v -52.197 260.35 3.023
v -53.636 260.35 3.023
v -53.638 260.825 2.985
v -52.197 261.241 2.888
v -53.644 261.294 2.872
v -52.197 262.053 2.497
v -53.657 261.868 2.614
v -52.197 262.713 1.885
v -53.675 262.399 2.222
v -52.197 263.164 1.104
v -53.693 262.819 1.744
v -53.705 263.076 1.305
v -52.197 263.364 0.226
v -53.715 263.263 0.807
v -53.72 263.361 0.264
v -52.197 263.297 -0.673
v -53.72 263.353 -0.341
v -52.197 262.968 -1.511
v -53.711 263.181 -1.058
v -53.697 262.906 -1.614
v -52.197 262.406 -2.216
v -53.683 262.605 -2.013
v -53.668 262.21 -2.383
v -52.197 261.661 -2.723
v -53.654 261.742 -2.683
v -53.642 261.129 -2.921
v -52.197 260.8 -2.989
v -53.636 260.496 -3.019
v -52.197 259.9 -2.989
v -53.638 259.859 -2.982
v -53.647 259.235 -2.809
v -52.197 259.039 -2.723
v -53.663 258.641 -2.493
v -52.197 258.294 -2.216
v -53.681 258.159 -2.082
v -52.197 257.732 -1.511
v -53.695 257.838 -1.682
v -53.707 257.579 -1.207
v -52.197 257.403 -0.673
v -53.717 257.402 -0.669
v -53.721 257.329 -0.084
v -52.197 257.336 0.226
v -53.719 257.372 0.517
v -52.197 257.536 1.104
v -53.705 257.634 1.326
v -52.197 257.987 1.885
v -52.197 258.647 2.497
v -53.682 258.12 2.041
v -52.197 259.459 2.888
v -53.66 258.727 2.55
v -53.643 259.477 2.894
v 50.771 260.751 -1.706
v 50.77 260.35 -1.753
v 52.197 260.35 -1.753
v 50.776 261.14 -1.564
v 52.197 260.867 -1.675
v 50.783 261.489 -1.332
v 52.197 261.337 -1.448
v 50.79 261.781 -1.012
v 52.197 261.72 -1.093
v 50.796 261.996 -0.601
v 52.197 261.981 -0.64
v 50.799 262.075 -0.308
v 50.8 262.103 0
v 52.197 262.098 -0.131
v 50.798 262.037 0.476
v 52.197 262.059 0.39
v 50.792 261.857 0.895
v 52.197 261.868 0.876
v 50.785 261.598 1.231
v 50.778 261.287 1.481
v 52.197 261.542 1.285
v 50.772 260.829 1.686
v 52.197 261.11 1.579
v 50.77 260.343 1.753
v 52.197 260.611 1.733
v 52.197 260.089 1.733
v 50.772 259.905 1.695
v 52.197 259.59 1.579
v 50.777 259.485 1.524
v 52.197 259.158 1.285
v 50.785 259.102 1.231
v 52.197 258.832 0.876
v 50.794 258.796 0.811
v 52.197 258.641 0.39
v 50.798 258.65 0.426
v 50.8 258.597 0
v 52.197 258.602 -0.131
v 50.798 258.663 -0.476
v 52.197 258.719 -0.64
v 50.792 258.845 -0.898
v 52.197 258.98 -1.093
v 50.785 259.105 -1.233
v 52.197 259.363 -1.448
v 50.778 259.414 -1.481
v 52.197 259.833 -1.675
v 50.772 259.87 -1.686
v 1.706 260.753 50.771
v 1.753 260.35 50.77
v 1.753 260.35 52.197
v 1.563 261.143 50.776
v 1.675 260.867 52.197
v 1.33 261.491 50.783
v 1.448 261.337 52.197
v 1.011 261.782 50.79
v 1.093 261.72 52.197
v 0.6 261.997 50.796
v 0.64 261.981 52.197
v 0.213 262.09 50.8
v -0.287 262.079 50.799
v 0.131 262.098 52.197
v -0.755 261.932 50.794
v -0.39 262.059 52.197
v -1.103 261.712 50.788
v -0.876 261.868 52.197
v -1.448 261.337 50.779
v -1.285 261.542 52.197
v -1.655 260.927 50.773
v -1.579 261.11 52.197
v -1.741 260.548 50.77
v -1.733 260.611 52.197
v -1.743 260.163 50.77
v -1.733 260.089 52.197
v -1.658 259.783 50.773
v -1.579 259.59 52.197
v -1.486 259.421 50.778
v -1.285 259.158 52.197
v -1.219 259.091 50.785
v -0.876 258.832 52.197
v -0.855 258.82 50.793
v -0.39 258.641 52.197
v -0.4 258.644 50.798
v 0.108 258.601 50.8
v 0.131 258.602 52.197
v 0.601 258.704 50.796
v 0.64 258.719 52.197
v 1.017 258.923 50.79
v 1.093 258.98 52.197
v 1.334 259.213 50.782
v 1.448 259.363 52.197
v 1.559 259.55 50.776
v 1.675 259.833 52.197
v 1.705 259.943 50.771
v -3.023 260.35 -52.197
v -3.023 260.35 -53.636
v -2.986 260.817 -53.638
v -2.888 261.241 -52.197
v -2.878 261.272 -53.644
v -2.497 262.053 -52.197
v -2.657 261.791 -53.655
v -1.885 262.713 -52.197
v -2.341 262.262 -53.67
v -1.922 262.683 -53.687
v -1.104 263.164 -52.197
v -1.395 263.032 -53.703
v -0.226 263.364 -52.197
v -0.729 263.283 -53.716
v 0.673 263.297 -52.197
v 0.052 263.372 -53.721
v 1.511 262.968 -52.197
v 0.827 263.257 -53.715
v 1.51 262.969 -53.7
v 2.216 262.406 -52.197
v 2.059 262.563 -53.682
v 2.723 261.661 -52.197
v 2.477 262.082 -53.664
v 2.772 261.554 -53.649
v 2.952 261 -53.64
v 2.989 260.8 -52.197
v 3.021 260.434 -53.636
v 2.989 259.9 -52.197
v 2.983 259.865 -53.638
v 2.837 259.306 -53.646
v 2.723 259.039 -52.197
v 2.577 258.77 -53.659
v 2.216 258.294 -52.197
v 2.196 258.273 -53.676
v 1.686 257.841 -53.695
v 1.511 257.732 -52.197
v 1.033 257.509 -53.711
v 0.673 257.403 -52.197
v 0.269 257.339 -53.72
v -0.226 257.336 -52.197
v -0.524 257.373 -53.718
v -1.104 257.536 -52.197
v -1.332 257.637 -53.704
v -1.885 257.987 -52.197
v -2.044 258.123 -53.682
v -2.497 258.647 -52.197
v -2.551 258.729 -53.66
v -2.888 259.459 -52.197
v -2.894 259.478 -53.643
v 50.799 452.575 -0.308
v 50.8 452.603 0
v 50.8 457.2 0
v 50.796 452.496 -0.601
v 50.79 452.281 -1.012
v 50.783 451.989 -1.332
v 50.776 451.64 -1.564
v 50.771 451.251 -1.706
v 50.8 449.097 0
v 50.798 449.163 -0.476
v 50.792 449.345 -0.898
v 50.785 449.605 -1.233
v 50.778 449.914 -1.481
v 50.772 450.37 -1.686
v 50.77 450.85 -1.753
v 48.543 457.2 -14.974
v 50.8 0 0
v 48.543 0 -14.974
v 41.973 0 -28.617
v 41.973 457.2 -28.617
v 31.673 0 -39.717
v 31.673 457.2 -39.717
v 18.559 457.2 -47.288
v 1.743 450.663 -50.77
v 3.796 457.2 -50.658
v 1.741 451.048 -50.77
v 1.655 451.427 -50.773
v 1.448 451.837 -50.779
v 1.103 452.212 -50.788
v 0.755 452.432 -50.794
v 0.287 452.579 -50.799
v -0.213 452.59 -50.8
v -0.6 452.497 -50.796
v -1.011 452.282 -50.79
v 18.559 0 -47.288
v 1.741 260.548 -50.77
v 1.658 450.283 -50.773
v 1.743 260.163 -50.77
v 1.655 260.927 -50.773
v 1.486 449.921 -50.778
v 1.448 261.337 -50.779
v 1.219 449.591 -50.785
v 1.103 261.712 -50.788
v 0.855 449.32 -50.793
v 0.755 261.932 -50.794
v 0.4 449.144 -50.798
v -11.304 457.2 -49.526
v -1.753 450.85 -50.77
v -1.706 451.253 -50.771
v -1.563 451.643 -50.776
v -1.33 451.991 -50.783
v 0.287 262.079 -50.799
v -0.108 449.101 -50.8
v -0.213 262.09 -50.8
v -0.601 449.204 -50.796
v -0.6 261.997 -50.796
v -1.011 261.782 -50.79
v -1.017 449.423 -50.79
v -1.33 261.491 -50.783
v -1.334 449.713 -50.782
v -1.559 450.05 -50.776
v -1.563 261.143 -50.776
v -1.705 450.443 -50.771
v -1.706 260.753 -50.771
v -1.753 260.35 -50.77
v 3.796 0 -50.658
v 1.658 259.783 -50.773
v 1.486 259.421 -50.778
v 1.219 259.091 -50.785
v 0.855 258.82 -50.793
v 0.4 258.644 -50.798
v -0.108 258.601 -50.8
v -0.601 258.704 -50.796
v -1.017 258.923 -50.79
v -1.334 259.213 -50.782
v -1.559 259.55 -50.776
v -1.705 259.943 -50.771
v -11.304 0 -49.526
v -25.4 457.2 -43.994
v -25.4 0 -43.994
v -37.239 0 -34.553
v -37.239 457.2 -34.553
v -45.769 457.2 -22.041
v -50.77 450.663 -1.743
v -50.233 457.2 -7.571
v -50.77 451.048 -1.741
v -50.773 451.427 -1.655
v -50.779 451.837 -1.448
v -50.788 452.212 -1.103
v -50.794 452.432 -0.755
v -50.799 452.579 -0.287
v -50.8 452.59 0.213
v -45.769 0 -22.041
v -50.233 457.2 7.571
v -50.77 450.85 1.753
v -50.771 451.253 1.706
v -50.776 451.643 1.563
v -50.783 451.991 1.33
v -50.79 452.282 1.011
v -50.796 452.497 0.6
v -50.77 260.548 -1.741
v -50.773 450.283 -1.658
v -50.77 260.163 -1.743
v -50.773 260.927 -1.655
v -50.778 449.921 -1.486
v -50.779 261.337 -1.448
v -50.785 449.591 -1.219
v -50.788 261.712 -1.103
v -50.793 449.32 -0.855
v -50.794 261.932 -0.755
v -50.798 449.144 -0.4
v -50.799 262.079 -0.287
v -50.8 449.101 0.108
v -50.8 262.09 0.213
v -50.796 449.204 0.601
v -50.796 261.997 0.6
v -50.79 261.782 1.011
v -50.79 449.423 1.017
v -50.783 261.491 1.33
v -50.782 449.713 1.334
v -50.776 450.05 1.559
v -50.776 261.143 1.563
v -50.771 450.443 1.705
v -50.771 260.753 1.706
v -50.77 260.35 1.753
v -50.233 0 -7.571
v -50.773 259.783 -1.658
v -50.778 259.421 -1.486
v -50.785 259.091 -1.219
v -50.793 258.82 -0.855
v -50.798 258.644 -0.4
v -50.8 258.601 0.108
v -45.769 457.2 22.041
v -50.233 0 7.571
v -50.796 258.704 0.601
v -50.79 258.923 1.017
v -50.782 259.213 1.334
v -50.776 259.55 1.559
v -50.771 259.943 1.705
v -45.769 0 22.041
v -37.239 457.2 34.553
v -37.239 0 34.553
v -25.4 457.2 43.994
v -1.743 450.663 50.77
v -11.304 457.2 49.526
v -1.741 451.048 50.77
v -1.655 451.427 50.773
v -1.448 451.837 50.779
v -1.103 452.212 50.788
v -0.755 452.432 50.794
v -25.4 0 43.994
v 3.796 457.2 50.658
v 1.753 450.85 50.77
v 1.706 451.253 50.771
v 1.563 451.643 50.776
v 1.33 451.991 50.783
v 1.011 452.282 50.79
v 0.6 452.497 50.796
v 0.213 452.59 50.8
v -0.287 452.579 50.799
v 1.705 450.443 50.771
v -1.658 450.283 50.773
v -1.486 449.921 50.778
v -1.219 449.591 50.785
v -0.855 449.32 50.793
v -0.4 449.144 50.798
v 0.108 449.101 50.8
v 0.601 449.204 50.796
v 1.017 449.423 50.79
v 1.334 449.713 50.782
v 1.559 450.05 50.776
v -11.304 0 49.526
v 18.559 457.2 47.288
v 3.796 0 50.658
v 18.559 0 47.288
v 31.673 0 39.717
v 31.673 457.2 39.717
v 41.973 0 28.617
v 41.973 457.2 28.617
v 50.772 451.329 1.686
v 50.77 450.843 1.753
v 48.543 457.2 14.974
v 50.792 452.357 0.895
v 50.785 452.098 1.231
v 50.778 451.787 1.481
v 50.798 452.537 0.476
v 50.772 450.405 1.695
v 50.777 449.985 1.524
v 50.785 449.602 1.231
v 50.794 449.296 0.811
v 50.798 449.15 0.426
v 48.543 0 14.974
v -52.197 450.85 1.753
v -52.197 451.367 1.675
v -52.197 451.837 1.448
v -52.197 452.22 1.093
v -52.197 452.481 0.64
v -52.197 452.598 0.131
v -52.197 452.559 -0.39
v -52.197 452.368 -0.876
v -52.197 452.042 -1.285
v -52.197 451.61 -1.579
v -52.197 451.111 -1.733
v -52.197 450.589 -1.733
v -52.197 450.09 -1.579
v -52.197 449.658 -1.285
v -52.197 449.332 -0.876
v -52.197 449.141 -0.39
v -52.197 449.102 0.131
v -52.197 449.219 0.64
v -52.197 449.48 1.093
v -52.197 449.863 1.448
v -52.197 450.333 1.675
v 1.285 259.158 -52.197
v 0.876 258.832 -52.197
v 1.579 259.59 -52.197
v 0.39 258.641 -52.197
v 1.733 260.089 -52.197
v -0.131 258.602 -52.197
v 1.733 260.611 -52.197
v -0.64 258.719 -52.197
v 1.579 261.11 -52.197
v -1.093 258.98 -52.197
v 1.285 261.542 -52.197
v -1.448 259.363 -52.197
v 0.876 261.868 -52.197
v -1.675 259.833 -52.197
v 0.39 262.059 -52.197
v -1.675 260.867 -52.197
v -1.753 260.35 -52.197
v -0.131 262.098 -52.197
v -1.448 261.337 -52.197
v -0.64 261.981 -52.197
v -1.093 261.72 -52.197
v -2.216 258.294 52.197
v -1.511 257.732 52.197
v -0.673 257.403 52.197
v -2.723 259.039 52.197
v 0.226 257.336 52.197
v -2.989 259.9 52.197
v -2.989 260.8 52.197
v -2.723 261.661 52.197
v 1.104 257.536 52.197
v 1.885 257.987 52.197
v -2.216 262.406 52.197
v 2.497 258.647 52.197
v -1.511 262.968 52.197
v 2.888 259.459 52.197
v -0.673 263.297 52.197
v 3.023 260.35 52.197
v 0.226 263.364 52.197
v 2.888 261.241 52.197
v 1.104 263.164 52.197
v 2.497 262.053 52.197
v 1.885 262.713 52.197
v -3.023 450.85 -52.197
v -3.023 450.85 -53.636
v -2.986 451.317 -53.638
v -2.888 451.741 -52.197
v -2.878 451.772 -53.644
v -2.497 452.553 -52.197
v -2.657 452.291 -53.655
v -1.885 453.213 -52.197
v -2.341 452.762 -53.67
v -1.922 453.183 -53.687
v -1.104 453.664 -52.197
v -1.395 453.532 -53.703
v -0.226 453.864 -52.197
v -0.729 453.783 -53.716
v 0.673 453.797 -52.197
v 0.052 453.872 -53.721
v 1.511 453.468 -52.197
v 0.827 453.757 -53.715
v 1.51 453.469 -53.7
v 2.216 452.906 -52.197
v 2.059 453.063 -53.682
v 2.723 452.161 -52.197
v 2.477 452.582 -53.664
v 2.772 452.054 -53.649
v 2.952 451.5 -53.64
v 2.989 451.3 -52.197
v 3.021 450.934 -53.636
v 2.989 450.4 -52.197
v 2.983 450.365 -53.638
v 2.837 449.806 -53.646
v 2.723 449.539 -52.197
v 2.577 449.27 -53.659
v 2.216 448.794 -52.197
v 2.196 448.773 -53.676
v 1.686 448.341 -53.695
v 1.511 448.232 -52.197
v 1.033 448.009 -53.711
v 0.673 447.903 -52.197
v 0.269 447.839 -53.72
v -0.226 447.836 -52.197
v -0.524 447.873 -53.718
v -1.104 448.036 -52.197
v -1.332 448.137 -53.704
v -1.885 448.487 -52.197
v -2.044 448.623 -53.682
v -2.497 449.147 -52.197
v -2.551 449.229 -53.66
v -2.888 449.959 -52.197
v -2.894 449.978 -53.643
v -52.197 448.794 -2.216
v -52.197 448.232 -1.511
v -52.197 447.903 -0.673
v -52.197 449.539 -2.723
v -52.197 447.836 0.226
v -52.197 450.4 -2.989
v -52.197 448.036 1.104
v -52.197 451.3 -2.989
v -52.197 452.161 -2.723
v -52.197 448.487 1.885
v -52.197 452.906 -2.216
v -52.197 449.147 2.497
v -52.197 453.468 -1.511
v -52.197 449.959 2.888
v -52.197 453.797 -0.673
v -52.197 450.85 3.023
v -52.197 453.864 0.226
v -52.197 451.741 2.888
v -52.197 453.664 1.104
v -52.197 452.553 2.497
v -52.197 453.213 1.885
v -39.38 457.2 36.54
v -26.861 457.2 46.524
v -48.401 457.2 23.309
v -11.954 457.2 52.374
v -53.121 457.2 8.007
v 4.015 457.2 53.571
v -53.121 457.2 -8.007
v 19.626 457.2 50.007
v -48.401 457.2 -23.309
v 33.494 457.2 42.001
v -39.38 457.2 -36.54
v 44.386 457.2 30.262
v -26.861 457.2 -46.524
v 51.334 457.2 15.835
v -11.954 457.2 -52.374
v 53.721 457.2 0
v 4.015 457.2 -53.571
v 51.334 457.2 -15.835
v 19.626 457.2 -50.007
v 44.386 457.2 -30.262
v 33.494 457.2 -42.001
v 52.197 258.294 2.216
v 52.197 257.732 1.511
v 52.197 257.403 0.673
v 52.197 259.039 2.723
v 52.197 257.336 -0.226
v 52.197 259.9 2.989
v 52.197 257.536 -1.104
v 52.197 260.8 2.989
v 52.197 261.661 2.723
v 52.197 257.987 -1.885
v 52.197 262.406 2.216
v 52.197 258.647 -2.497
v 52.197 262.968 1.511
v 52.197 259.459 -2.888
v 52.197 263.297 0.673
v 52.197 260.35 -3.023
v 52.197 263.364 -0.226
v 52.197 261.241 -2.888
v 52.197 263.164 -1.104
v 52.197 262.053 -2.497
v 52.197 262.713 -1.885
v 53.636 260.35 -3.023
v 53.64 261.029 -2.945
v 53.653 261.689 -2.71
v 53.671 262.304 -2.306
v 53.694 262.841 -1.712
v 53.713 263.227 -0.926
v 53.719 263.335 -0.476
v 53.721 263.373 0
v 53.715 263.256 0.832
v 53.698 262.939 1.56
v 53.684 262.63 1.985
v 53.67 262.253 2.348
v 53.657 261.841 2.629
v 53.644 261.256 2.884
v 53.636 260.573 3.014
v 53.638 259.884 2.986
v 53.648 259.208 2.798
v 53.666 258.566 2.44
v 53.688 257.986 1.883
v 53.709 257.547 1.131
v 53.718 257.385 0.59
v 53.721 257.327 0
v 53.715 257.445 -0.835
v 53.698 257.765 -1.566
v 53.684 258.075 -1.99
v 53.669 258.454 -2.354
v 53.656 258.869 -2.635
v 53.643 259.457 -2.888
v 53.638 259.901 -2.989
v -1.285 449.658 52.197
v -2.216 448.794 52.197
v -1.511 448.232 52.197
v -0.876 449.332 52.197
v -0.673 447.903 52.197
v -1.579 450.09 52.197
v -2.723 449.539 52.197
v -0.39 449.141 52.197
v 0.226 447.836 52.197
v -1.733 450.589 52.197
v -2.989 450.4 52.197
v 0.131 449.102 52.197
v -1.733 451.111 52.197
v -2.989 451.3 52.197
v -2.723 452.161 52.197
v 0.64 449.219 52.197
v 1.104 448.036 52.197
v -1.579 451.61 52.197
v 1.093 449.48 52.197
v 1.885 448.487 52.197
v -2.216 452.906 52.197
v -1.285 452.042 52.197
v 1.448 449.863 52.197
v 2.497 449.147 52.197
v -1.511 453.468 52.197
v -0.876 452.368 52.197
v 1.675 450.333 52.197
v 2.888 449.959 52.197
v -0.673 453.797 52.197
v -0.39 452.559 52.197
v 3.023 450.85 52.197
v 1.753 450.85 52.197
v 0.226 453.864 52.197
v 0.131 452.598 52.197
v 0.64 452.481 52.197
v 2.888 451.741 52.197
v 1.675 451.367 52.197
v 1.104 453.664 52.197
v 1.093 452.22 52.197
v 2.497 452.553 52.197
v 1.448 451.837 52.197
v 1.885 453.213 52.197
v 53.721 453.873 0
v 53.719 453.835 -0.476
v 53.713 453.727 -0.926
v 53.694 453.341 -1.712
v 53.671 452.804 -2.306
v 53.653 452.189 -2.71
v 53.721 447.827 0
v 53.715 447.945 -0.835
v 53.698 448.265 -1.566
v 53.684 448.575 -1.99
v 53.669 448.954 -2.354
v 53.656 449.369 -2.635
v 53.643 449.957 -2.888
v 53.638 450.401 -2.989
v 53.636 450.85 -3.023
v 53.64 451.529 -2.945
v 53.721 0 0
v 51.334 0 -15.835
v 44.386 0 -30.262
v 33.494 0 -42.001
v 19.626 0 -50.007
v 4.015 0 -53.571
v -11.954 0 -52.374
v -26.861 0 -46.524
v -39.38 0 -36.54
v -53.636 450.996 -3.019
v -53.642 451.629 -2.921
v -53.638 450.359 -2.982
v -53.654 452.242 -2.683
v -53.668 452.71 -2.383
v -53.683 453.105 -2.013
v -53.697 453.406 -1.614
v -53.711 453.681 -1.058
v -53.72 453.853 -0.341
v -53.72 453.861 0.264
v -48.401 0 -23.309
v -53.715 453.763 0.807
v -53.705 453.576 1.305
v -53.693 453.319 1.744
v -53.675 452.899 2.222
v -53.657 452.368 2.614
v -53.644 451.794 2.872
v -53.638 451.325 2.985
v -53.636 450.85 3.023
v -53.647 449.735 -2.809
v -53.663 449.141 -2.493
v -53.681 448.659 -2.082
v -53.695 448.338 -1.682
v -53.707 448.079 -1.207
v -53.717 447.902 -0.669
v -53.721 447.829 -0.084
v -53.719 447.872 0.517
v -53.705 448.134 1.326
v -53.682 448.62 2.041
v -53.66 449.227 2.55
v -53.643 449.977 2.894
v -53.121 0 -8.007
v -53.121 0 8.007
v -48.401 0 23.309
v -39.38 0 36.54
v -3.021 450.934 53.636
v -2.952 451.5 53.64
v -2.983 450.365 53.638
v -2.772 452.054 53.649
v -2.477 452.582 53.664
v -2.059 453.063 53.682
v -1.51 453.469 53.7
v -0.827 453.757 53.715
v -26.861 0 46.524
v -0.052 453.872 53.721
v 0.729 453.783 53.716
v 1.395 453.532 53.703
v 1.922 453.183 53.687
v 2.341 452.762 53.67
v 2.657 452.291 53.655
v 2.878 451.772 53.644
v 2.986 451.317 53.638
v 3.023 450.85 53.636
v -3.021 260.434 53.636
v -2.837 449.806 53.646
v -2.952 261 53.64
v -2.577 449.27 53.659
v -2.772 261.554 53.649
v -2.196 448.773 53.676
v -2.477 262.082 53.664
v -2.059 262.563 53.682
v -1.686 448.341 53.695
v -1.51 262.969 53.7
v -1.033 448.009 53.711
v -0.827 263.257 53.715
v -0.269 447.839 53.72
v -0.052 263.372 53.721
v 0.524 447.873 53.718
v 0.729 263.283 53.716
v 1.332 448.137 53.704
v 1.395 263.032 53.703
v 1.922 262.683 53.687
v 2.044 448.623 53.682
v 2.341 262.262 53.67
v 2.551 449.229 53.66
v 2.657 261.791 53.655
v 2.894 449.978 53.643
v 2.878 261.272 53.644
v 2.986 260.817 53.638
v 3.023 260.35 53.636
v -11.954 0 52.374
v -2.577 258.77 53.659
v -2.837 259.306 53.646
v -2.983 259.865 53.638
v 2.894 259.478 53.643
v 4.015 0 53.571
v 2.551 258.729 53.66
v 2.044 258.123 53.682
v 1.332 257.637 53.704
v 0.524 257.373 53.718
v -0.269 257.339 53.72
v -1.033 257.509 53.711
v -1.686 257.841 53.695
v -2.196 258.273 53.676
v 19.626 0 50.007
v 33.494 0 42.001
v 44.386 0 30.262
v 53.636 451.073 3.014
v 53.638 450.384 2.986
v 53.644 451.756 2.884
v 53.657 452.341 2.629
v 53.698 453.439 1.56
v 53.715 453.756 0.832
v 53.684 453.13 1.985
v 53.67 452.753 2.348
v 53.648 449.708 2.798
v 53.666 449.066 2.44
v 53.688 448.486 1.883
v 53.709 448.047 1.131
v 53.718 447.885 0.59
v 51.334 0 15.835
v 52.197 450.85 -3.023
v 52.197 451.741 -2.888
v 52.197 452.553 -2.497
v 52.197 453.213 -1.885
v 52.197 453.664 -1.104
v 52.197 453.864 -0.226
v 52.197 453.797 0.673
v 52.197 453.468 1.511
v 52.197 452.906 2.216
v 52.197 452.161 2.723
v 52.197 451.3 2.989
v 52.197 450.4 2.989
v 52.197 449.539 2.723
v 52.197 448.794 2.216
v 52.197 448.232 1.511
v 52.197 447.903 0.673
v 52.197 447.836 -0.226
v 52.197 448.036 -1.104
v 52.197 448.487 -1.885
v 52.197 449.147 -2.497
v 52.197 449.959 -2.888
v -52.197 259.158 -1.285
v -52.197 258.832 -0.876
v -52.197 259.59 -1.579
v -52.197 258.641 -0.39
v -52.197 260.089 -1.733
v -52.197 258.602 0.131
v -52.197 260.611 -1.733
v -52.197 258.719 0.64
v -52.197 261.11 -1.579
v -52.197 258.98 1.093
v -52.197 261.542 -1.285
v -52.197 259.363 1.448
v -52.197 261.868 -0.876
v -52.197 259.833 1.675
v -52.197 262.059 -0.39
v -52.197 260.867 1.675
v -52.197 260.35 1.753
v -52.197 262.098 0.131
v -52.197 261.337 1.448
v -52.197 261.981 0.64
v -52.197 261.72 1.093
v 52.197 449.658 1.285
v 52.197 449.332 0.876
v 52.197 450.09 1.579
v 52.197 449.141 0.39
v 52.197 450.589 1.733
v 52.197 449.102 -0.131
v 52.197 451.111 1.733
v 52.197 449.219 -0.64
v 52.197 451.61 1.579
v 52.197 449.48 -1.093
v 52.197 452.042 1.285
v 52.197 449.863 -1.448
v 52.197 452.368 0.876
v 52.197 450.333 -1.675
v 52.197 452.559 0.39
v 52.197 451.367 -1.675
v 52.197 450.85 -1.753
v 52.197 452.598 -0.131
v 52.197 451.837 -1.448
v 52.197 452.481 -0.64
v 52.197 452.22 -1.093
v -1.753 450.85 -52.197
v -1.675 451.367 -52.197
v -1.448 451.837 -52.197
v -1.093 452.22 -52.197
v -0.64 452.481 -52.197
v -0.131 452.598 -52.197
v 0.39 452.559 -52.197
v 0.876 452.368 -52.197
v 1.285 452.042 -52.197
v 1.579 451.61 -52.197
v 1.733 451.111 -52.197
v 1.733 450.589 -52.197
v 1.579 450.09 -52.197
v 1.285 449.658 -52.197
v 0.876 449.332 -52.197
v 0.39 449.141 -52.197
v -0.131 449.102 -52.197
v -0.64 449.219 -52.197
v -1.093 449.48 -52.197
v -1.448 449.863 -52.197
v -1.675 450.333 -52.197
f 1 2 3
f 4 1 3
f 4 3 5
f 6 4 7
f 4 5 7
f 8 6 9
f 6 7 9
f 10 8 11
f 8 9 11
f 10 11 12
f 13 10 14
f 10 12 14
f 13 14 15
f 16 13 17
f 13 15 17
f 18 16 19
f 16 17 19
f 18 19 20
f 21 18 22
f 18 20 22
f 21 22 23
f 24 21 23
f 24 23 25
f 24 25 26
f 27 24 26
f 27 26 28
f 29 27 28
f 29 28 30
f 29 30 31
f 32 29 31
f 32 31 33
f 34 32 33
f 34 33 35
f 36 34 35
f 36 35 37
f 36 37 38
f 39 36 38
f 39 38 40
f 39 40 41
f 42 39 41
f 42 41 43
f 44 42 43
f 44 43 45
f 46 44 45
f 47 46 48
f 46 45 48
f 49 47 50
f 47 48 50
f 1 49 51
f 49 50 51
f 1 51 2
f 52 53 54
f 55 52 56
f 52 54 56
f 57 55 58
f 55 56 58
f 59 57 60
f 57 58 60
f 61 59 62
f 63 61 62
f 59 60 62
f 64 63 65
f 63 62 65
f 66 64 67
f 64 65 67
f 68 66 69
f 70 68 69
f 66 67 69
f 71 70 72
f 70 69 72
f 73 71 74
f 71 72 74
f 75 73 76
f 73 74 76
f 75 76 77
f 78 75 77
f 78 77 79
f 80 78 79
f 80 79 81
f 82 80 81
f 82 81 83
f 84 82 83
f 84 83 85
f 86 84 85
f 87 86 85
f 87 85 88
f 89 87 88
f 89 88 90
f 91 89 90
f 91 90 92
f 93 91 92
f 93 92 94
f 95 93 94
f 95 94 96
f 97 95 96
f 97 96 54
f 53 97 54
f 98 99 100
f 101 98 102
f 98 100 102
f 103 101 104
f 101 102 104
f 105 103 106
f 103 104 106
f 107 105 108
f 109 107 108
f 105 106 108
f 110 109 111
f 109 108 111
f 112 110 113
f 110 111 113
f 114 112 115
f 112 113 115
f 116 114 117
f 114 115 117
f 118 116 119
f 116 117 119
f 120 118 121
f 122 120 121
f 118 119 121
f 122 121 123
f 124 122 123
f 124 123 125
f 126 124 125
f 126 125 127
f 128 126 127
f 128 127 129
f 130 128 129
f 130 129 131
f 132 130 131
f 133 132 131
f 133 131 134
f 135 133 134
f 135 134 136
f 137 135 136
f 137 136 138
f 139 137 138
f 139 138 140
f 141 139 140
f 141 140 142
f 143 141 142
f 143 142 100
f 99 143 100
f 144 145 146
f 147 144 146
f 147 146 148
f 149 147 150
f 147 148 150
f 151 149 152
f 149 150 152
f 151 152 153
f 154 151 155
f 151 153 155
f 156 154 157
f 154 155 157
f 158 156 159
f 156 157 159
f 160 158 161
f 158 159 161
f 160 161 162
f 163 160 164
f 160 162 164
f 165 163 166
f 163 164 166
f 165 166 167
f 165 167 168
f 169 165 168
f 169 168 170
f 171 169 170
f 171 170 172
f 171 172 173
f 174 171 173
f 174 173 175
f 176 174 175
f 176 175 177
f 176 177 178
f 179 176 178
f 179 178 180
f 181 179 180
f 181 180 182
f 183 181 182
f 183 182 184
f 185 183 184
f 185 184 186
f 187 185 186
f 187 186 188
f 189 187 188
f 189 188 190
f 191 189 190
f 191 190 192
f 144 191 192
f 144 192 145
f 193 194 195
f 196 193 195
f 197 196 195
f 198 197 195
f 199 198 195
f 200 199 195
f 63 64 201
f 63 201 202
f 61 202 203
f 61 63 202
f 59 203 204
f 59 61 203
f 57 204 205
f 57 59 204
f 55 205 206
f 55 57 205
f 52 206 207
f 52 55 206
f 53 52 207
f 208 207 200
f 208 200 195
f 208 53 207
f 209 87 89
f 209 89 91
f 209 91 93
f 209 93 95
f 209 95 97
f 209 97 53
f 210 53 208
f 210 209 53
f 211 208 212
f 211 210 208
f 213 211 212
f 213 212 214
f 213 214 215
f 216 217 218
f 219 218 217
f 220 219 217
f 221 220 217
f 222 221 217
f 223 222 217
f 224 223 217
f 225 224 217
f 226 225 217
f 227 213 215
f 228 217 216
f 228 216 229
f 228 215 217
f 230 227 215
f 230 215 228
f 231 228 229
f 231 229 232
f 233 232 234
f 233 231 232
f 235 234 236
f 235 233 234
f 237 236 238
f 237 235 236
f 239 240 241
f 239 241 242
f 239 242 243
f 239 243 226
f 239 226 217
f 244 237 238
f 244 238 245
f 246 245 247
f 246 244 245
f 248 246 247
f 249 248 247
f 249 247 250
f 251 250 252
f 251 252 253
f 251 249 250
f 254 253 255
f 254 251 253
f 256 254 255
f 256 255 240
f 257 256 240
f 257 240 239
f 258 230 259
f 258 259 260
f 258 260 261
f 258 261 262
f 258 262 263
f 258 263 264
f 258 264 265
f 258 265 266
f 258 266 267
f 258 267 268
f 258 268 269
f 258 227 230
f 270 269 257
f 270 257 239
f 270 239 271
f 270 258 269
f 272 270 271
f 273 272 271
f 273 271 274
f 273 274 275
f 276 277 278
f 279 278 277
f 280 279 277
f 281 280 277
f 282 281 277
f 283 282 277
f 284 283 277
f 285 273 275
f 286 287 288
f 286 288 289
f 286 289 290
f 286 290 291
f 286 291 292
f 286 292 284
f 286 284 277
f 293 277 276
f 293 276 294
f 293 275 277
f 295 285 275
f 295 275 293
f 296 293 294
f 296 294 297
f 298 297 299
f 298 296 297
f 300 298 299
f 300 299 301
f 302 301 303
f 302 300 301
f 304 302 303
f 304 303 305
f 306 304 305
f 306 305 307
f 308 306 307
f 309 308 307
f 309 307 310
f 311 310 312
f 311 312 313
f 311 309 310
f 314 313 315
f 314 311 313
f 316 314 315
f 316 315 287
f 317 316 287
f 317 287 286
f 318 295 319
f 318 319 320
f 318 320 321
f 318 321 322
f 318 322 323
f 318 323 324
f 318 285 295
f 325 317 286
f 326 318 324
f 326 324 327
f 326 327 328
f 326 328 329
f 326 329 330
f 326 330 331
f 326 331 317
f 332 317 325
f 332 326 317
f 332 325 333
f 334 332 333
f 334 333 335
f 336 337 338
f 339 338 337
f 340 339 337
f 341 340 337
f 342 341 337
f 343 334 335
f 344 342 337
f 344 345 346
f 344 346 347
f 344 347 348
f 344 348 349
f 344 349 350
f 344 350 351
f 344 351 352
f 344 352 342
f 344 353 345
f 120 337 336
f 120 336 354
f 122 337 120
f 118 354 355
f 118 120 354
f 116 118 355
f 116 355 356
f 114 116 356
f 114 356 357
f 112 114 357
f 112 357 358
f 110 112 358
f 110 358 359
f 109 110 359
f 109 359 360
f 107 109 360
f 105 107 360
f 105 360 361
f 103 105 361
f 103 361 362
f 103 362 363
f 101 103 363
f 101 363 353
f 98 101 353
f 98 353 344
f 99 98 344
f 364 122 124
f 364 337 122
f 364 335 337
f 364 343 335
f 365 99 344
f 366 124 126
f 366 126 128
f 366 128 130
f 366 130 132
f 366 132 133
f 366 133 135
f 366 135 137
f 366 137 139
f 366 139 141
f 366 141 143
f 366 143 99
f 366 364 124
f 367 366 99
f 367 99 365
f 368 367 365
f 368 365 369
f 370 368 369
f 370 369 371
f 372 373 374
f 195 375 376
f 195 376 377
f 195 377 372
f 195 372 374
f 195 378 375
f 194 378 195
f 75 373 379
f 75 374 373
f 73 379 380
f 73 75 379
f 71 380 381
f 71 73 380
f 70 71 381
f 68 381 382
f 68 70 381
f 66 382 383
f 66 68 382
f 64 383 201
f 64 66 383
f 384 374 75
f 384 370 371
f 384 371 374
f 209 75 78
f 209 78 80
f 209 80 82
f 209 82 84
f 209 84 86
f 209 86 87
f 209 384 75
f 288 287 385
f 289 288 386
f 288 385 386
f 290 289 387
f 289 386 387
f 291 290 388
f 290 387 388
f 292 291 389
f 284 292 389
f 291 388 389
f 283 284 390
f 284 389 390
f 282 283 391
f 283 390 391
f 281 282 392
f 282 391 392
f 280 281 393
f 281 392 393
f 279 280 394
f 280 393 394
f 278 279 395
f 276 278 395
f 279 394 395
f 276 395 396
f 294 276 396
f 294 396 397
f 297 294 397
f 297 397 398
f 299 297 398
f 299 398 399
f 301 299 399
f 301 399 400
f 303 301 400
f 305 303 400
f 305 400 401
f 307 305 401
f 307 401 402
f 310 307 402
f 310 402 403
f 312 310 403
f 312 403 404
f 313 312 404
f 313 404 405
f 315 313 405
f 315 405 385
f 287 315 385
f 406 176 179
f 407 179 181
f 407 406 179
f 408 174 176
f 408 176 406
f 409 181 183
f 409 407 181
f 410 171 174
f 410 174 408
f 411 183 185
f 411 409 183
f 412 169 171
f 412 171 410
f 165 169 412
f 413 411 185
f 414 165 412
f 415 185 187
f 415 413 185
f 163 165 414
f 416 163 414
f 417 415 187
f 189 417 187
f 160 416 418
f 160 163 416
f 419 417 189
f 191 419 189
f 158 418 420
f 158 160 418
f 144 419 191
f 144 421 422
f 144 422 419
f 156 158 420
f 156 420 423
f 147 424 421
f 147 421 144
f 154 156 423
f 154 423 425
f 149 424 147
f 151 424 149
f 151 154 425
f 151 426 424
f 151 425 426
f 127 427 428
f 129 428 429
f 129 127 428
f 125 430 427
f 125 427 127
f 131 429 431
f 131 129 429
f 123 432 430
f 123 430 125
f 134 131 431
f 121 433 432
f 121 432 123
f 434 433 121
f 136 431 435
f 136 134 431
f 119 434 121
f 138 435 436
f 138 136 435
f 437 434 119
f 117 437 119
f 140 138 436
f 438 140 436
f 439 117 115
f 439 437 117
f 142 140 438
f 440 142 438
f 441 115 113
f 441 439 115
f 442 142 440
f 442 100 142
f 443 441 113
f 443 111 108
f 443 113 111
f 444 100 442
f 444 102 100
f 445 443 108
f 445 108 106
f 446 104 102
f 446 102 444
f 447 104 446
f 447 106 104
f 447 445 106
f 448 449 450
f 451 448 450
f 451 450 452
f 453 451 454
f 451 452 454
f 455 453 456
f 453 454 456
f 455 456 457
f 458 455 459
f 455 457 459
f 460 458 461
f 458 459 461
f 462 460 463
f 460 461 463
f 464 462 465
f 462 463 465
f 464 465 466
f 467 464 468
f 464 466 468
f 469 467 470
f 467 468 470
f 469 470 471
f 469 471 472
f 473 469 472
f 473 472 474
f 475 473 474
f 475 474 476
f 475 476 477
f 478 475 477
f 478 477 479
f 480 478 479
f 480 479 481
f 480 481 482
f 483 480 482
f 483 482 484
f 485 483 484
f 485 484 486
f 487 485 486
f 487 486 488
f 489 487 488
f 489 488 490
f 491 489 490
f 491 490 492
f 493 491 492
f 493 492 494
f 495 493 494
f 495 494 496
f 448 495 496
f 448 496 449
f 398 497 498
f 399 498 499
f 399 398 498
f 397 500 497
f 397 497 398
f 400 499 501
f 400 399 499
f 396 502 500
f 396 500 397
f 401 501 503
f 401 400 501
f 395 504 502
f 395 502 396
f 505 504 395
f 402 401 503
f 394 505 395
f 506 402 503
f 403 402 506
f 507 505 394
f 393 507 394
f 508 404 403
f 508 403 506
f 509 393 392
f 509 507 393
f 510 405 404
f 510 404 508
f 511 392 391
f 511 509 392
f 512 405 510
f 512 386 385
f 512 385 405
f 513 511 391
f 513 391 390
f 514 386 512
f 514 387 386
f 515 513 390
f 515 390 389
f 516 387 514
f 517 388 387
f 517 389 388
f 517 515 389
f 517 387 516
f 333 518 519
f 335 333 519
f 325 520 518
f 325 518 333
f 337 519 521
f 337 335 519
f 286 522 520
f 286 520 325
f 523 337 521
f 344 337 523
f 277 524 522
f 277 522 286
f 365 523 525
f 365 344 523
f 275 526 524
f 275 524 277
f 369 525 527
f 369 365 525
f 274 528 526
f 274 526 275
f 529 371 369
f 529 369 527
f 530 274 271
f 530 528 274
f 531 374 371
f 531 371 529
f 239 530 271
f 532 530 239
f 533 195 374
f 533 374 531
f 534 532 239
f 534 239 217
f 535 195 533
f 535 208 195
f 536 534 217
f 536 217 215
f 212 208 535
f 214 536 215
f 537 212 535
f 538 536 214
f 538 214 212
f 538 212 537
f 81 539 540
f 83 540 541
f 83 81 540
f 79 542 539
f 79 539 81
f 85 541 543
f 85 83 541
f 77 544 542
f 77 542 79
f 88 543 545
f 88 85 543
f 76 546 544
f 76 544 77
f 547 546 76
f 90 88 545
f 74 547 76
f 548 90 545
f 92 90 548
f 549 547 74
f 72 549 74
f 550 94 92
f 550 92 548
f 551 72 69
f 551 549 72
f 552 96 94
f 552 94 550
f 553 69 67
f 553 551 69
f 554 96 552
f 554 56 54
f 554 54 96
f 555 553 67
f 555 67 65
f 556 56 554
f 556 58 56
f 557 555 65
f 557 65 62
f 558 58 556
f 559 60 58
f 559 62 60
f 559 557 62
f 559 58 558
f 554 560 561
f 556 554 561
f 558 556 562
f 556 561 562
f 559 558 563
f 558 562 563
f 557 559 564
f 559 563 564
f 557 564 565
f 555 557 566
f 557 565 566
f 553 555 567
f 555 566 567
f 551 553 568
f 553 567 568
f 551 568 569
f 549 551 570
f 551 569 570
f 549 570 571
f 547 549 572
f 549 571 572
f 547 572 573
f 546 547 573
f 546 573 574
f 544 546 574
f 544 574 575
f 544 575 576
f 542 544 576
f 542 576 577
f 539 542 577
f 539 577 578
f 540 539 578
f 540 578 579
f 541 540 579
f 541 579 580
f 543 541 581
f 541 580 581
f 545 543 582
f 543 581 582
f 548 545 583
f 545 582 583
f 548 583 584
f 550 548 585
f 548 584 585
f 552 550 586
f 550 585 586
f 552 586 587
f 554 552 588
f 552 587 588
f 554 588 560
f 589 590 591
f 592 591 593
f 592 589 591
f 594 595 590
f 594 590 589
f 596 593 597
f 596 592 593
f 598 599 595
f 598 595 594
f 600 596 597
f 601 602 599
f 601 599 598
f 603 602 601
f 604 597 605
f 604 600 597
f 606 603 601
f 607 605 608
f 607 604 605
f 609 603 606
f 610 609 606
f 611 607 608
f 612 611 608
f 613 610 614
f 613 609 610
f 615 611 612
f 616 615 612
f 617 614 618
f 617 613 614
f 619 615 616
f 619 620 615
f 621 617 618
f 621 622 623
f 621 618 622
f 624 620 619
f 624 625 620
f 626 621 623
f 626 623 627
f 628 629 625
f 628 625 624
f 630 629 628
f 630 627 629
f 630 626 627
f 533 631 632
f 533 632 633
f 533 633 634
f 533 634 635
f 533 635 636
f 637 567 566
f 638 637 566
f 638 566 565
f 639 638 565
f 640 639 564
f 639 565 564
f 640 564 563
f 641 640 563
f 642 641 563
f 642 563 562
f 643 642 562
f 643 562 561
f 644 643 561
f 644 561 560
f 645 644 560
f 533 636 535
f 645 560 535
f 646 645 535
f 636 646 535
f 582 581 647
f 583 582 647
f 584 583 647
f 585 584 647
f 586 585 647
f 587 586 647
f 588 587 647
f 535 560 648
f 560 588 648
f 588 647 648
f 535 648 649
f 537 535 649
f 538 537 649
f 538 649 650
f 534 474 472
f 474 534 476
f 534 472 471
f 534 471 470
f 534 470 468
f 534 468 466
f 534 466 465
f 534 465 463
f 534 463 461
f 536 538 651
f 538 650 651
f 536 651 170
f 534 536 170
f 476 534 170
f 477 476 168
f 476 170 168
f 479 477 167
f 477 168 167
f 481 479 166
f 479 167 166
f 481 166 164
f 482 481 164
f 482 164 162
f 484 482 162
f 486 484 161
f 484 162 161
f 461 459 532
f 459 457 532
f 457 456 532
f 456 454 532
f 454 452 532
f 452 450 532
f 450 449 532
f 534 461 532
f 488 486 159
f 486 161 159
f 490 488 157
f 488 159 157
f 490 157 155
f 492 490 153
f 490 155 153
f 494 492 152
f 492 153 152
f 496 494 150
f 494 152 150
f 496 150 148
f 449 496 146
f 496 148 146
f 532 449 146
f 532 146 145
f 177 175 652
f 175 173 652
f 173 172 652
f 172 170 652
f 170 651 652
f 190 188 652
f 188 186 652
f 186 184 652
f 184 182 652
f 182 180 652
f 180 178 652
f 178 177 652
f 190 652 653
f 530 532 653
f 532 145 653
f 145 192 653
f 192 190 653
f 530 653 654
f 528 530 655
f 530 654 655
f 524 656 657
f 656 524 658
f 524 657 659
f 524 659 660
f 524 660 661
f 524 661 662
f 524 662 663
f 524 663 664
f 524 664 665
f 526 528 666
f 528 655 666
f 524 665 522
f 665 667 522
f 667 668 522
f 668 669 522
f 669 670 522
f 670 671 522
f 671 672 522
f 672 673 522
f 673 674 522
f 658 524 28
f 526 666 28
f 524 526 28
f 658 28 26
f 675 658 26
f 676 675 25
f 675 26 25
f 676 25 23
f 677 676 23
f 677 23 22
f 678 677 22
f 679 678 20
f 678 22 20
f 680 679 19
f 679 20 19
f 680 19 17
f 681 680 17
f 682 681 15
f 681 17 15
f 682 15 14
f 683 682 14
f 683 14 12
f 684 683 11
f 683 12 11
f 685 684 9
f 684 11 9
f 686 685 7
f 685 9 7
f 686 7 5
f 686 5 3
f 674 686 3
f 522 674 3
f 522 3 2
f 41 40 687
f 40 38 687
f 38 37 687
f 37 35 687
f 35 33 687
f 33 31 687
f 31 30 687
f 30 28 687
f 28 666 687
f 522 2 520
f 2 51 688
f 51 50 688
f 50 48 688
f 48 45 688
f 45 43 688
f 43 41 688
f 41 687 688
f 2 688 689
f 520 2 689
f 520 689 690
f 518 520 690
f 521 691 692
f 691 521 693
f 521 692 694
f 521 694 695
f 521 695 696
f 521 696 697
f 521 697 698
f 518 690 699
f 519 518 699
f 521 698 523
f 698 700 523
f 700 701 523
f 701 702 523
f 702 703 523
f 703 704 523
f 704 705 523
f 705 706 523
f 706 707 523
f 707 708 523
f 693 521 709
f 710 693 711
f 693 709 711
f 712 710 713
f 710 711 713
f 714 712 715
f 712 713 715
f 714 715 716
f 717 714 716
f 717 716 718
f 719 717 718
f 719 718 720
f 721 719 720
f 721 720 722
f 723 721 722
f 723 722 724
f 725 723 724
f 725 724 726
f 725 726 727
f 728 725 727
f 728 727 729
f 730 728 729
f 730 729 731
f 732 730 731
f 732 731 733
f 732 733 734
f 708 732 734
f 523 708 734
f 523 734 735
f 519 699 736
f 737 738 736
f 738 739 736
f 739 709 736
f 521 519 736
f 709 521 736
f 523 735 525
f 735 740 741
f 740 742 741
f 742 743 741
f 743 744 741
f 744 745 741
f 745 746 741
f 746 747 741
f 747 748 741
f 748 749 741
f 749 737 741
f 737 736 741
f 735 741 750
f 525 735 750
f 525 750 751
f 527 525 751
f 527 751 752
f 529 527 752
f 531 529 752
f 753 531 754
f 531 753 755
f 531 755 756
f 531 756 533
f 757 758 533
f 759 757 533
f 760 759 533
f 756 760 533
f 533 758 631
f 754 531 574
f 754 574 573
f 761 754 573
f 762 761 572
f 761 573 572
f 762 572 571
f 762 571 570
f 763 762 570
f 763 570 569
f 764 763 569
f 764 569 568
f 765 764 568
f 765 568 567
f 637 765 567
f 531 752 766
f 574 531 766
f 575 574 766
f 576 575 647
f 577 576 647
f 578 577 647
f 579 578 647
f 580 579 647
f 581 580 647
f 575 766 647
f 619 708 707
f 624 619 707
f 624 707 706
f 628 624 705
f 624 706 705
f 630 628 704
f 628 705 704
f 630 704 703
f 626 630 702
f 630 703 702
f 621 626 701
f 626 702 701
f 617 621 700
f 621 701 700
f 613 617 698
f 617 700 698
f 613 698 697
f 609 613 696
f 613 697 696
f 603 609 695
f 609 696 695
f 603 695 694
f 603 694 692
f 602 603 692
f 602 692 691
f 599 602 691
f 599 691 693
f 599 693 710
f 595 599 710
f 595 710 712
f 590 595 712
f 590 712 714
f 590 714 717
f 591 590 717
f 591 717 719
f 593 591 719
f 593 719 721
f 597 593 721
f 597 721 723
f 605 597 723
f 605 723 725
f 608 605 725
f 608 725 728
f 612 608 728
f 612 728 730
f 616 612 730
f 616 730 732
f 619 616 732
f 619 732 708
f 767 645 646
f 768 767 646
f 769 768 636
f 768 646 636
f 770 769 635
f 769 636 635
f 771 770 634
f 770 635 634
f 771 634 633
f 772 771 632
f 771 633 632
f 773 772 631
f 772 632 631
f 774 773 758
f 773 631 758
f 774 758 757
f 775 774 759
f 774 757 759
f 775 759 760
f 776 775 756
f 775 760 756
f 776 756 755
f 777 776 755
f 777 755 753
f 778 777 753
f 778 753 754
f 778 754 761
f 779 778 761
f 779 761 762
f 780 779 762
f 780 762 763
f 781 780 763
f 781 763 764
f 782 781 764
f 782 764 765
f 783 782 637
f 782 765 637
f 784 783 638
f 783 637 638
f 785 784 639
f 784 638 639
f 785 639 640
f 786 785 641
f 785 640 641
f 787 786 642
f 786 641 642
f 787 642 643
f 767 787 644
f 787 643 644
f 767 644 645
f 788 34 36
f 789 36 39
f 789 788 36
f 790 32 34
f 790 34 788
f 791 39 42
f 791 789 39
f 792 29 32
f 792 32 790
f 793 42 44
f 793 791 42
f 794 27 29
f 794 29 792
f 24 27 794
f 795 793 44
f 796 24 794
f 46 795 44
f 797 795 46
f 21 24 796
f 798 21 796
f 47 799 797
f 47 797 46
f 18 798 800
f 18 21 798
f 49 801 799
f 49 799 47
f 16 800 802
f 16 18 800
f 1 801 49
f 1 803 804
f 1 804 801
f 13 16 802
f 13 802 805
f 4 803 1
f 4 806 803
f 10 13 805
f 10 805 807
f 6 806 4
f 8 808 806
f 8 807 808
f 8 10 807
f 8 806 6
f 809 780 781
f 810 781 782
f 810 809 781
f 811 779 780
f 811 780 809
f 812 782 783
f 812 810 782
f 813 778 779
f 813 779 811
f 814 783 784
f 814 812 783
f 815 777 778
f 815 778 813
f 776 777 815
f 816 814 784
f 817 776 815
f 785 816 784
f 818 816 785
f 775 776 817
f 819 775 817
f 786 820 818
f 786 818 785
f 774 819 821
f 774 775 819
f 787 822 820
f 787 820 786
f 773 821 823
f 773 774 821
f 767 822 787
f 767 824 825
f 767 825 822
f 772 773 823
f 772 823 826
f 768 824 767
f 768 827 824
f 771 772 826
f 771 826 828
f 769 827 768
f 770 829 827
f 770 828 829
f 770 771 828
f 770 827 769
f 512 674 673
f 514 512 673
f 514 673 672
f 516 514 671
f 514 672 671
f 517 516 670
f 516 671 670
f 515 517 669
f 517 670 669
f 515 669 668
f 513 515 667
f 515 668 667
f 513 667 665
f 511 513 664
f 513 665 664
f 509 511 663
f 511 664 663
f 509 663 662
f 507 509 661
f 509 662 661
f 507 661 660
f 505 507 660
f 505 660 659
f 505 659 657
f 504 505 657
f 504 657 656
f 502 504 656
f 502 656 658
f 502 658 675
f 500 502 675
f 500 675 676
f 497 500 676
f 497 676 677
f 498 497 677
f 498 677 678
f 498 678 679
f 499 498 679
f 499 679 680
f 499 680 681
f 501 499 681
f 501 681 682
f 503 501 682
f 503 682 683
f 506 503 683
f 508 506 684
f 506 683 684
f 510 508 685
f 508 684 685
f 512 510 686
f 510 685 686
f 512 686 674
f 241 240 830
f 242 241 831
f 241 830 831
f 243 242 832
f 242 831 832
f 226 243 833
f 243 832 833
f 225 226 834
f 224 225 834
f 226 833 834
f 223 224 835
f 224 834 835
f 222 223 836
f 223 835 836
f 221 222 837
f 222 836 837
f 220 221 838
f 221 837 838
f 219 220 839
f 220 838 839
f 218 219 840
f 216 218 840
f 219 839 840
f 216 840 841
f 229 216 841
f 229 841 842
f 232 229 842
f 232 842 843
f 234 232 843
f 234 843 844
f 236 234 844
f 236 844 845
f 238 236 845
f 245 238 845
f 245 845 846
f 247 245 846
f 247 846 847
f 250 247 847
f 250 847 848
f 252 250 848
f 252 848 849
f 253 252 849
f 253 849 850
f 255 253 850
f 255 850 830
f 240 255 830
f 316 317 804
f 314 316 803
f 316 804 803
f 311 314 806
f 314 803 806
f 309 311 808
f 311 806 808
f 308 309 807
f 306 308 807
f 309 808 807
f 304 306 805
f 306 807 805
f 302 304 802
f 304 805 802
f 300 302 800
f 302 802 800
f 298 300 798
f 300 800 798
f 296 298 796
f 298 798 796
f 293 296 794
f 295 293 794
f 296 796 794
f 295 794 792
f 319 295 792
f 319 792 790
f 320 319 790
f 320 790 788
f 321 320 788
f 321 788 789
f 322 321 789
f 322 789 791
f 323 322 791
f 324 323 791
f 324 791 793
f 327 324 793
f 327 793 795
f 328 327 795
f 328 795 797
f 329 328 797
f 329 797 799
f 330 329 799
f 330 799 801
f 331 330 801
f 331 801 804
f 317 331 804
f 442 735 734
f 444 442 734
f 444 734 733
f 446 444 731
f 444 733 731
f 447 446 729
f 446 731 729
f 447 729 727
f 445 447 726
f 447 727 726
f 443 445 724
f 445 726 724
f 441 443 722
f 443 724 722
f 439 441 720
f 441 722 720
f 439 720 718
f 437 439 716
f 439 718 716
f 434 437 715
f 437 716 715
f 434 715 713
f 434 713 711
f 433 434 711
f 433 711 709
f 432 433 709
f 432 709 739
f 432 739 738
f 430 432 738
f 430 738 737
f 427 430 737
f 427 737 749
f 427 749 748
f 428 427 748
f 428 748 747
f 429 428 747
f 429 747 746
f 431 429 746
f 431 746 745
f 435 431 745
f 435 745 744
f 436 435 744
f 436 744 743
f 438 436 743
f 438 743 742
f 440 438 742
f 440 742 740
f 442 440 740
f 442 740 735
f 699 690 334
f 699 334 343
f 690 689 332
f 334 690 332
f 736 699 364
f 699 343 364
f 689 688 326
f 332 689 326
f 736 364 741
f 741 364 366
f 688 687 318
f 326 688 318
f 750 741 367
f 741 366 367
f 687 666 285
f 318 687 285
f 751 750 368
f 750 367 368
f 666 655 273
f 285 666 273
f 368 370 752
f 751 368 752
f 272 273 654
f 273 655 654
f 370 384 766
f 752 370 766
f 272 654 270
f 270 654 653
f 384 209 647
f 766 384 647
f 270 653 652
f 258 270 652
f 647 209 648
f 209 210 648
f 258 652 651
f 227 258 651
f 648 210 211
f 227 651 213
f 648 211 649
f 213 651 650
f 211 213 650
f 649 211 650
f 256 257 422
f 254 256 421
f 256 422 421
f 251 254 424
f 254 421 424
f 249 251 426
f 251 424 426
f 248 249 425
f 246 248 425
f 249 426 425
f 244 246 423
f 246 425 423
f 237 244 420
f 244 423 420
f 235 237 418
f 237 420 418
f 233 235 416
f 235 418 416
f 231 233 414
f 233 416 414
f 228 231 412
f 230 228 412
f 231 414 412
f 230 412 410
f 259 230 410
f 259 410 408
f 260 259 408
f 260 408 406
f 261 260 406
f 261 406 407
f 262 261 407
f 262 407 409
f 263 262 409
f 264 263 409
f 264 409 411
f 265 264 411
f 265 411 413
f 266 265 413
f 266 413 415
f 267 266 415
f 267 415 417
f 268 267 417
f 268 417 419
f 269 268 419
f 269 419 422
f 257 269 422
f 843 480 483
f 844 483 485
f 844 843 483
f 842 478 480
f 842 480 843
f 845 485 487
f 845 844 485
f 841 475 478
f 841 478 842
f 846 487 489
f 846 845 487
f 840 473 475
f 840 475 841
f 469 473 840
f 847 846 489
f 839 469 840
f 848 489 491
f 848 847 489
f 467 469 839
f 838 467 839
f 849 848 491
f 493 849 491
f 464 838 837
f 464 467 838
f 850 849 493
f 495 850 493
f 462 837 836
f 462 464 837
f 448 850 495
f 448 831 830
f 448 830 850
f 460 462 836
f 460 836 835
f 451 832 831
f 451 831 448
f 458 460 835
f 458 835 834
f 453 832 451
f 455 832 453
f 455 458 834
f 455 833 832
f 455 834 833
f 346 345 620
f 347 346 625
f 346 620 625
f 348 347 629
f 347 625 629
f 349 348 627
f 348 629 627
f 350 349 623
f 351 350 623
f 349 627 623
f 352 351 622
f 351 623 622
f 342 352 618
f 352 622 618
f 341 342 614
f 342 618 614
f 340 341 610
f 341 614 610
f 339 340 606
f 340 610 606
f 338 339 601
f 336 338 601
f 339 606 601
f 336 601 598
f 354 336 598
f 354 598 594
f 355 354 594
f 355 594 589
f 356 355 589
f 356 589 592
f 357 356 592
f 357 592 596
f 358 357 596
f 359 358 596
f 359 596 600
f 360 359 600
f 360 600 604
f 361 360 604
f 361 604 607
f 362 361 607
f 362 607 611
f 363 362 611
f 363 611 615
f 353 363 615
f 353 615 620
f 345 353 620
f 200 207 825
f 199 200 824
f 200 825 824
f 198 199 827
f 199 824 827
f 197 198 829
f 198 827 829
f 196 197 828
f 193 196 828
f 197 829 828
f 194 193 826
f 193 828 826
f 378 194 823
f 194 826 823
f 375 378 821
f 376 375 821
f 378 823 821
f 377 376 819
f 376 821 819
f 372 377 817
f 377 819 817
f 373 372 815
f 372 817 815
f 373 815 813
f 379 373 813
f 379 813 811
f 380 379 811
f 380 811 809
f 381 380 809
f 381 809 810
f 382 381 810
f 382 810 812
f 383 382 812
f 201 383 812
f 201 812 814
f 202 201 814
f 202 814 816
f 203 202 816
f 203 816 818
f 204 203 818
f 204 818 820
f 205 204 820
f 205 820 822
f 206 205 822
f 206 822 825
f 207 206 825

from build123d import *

# Parameters (mm, degrees)
SKETCH1_R                         = 53.721
SKETCH1_R_2                       = 50.8
BODY_EXTRUSION_DEPTH              = 457.2
UPPER_BULKHEAD_HOLES_REACH        = 474.717
UPPER_BULKHEAD_HOLES_END_RADIUS   = 50.8
SKETCH2_R                         = 1.7526
UPPER_BULKHEAD_HOLE_PATTERN_COUNT = 4
LOWER_BULKHEAD_HOLES_REACH        = 474.717
LOWER_BULKHEAD_HOLES_END_RADIUS   = 50.8
SKETCH3_R                         = 1.7526
LOWER_BULKHEAD_HOLE_PATTERN_COUNT = 4
SKETCH4_R                         = 3.0226
COUNTERSINK_DEPTH                 = 1.524
COUNTERSINK_PATTERN_COUNT         = 4


with BuildPart() as part:
    # Sketch1 → Body Extrusion (new body)
    with BuildSketch(Plane(origin=(0, 0, 0), x_dir=(1, 0, 0), z_dir=(0, 1, 0))):
        Circle(SKETCH1_R)
        Circle(SKETCH1_R_2, mode=Mode.SUBTRACT)
    extrude(amount=BODY_EXTRUSION_DEPTH)

    # Upper Bulkhead Holes: up to this cylinder (the profile starts outside it)
    upper_bulkhead_holes_end = Plane(origin=(0, 450.85, 0), z_dir=(0, -1, 0)) * Cylinder(UPPER_BULKHEAD_HOLES_END_RADIUS, 1052.034, mode=Mode.PRIVATE)
    # Sketch2 → Upper Bulkhead Holes (cut, up to the surface)
    with BuildSketch(Plane.XY.offset(53.721), mode=Mode.PRIVATE) as upper_bulkhead_holes_sk1:
        with Locations((0, 450.85)):
            Circle(SKETCH2_R)
    upper_bulkhead_holes_tool1 = extrude(upper_bulkhead_holes_sk1.sketch, amount=-UPPER_BULKHEAD_HOLES_REACH, mode=Mode.PRIVATE) - upper_bulkhead_holes_end
    upper_bulkhead_holes = upper_bulkhead_holes_tool1.solids().sort_by_distance((0, 450.85, 53.721))[0]
    add(upper_bulkhead_holes, mode=Mode.SUBTRACT)

    # Upper Bulkhead Hole Pattern: Upper Bulkhead Holes ×4 about axis
    upper_bulkhead_hole_pattern_axis = Axis((0, 457.2, 0), (0, -1, 0))
    for i in range(1, UPPER_BULKHEAD_HOLE_PATTERN_COUNT):
        add(upper_bulkhead_holes.rotate(upper_bulkhead_hole_pattern_axis, i * 360 / UPPER_BULKHEAD_HOLE_PATTERN_COUNT), mode=Mode.SUBTRACT)

    # Lower Bulkhead Holes: up to this cylinder (the profile starts outside it)
    lower_bulkhead_holes_end = Plane(origin=(0, 260.35, 0), z_dir=(0, -1, 0)) * Cylinder(LOWER_BULKHEAD_HOLES_END_RADIUS, 1052.034, mode=Mode.PRIVATE)
    # Sketch3 → Lower Bulkhead Holes (cut, up to the surface)
    with BuildSketch(Plane.XY.offset(53.721), mode=Mode.PRIVATE) as lower_bulkhead_holes_sk1:
        with Locations((0, 260.35)):
            Circle(SKETCH3_R)
    lower_bulkhead_holes_tool1 = extrude(lower_bulkhead_holes_sk1.sketch, amount=-LOWER_BULKHEAD_HOLES_REACH, mode=Mode.PRIVATE) - lower_bulkhead_holes_end
    lower_bulkhead_holes = lower_bulkhead_holes_tool1.solids().sort_by_distance((0, 260.35, 53.721))[0]
    add(lower_bulkhead_holes, mode=Mode.SUBTRACT)

    # Lower Bulkhead Hole Pattern: Lower Bulkhead Holes ×4 about axis
    lower_bulkhead_hole_pattern_axis = Axis((0, 457.2, 0), (0, -1, 0))
    for i in range(1, LOWER_BULKHEAD_HOLE_PATTERN_COUNT):
        add(lower_bulkhead_holes.rotate(lower_bulkhead_hole_pattern_axis, i * 360 / LOWER_BULKHEAD_HOLE_PATTERN_COUNT), mode=Mode.SUBTRACT)

    # Sketch4 → Countersink (cut)
    with BuildSketch(Plane.XY.offset(53.721)):
        with Locations((0, 450.85)):
            Circle(SKETCH4_R)
        with Locations((0, 260.35)):
            Circle(SKETCH4_R)
    countersink = extrude(amount=-COUNTERSINK_DEPTH, mode=Mode.SUBTRACT)

    # Countersink Pattern: Countersink ×4 about axis
    countersink_pattern_axis = Axis((0, 0, 0), (0, 1, 0))
    for i in range(1, COUNTERSINK_PATTERN_COUNT):
        add(countersink.rotate(countersink_pattern_axis, i * 360 / COUNTERSINK_PATTERN_COUNT), mode=Mode.SUBTRACT)


solid = part.part
